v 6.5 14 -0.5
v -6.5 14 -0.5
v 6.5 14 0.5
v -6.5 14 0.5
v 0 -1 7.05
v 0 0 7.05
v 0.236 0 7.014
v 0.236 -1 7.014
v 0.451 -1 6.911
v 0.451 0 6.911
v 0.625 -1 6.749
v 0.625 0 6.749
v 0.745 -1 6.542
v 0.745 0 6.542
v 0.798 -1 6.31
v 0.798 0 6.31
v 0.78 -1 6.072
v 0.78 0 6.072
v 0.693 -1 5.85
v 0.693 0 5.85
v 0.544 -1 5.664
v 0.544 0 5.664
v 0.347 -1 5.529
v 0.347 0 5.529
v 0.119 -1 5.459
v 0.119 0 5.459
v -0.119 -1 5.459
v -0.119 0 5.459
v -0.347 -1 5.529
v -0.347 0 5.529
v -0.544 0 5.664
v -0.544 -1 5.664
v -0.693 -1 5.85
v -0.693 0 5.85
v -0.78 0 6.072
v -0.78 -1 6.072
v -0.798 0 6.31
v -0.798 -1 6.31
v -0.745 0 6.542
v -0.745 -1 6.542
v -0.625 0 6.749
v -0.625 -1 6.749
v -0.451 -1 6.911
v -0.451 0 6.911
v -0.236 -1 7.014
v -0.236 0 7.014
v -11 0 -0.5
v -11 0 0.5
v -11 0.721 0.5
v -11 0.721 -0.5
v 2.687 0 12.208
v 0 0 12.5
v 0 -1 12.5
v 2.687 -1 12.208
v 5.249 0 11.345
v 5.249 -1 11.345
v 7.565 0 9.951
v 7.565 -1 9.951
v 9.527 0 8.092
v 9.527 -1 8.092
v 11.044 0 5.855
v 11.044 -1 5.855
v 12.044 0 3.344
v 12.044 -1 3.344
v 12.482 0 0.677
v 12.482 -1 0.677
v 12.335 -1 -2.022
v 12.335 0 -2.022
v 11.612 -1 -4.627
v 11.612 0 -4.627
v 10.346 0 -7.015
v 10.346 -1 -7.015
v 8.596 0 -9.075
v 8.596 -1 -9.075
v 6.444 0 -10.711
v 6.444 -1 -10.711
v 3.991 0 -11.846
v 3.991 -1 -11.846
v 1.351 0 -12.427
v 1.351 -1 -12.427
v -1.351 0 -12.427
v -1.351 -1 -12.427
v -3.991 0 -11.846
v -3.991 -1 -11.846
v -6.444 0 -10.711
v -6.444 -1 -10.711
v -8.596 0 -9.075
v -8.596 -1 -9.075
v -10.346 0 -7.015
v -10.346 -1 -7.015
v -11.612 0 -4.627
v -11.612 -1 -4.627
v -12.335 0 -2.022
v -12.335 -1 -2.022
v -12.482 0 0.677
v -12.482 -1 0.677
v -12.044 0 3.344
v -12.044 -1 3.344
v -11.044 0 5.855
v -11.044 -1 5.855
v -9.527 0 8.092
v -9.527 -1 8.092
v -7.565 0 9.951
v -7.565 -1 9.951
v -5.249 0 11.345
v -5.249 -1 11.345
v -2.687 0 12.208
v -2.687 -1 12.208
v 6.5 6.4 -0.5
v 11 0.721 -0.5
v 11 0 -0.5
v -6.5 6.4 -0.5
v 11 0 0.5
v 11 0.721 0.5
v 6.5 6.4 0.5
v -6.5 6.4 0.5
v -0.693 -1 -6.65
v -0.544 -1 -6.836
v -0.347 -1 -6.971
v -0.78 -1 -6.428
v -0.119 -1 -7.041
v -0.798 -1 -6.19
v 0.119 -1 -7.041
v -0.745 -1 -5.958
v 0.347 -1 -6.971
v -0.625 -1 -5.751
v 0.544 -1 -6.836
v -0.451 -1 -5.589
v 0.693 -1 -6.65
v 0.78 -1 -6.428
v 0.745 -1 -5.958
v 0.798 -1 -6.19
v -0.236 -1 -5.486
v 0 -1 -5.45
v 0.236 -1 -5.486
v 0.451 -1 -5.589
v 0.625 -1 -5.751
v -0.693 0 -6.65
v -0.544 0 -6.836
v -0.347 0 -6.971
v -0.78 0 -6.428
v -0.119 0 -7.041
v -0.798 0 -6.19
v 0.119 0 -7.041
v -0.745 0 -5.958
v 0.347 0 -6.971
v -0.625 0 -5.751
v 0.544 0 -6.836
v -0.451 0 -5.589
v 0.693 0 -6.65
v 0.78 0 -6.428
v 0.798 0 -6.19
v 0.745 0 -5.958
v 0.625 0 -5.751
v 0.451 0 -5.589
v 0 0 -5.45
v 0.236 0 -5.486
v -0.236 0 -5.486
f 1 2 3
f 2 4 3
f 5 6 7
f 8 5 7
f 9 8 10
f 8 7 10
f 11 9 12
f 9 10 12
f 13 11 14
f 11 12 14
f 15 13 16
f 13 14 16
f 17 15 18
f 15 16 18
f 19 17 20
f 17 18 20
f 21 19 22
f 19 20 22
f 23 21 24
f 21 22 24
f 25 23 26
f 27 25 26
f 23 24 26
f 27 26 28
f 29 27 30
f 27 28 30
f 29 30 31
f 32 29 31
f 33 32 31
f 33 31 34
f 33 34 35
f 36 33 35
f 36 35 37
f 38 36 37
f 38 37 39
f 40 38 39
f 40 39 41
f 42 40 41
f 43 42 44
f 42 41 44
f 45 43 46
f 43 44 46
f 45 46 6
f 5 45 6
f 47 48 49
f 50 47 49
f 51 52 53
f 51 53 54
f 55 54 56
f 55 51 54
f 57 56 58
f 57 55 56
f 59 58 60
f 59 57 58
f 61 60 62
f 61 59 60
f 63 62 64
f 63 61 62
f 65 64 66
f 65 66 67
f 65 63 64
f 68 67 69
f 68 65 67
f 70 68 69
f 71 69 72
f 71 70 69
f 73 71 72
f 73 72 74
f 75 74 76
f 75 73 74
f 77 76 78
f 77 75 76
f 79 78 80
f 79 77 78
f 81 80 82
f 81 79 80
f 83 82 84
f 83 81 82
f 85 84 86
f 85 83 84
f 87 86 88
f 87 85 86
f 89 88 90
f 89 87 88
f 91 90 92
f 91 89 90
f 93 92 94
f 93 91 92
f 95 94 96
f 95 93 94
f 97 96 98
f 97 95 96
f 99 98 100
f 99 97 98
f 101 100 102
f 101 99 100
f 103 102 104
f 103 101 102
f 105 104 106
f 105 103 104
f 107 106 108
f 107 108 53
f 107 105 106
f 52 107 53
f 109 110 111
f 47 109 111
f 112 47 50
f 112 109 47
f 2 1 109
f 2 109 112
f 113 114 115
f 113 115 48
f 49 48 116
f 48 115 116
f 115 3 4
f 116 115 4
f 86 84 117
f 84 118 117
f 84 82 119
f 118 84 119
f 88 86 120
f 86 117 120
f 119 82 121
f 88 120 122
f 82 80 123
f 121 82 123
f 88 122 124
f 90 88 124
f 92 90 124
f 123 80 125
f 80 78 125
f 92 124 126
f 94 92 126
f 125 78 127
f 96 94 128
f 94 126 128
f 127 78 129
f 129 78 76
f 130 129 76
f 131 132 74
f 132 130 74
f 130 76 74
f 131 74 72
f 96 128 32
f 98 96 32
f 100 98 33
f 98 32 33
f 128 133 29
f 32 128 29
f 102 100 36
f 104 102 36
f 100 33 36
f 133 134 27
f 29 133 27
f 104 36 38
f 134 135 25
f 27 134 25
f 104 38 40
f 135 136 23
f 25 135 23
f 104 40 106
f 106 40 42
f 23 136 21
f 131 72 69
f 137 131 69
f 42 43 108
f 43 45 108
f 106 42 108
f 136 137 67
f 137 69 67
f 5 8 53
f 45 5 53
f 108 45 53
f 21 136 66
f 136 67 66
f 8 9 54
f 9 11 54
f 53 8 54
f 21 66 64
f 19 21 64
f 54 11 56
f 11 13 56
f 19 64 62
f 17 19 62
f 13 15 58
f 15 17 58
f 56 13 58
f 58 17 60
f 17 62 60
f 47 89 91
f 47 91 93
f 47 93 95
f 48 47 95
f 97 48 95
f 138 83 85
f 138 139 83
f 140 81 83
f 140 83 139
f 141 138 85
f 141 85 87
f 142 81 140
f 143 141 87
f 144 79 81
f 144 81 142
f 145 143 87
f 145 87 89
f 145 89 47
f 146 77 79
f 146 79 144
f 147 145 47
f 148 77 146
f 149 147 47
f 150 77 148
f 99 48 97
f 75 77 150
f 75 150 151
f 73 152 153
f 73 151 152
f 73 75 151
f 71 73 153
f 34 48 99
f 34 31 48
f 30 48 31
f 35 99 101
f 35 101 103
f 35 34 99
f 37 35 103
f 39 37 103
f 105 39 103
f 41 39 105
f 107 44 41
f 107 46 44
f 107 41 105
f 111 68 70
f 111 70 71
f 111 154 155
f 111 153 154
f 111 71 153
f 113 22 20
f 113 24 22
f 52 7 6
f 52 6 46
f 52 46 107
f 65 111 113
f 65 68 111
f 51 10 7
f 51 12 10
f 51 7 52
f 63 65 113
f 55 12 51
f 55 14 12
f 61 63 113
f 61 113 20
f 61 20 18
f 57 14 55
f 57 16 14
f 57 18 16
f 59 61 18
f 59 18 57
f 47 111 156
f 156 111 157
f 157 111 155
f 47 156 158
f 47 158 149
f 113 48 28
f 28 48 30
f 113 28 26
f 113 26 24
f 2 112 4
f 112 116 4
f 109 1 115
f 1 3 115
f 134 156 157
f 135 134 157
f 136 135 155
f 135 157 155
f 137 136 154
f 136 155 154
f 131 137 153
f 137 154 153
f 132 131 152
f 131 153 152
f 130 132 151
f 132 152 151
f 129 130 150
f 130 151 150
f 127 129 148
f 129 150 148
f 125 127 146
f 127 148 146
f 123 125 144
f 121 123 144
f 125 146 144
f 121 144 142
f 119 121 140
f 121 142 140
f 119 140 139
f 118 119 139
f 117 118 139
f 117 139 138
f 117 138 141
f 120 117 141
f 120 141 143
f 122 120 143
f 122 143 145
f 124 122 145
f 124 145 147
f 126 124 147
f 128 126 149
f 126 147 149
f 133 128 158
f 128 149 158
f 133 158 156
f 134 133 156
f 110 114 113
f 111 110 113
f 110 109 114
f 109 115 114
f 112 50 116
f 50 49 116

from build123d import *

# Parameters (mm, degrees)
SKETCH1_R           = 12.5
SKETCH1_R_2         = 0.8
BOSS_EXTRUDE1_DEPTH = 1
BOSS_EXTRUDE2_DEPTH = 0.5


with BuildPart() as part:
    # Sketch1 → Boss-Extrude1 (new body)
    with BuildSketch(Plane(origin=(0, 0, 0), x_dir=(1, 0, 0), z_dir=(0, 1, 0))):
        with Locations(Location((0, 0, 0), (0, 0, 270))):
            Circle(SKETCH1_R)
        with Locations(Location((0, 6.25, 0), (0, 0, 270))):
            Circle(SKETCH1_R_2, mode=Mode.SUBTRACT)
        with Locations(Location((0, -6.25, 0), (0, 0, 270))):
            Circle(SKETCH1_R_2, mode=Mode.SUBTRACT)
    extrude(amount=-BOSS_EXTRUDE1_DEPTH)

    # Sketch2 → Boss-Extrude2 (add, symmetric)
    with BuildSketch(Plane.XY):
        Polygon((-11, 0), (-11, 0.721206206), (-6.5, 6.4), (-6.5, 14), (6.5, 14), (6.5, 6.4), (11, 0.721206206), (11, 0), align=None)
    extrude(amount=BOSS_EXTRUDE2_DEPTH, both=True)


solid = part.part
